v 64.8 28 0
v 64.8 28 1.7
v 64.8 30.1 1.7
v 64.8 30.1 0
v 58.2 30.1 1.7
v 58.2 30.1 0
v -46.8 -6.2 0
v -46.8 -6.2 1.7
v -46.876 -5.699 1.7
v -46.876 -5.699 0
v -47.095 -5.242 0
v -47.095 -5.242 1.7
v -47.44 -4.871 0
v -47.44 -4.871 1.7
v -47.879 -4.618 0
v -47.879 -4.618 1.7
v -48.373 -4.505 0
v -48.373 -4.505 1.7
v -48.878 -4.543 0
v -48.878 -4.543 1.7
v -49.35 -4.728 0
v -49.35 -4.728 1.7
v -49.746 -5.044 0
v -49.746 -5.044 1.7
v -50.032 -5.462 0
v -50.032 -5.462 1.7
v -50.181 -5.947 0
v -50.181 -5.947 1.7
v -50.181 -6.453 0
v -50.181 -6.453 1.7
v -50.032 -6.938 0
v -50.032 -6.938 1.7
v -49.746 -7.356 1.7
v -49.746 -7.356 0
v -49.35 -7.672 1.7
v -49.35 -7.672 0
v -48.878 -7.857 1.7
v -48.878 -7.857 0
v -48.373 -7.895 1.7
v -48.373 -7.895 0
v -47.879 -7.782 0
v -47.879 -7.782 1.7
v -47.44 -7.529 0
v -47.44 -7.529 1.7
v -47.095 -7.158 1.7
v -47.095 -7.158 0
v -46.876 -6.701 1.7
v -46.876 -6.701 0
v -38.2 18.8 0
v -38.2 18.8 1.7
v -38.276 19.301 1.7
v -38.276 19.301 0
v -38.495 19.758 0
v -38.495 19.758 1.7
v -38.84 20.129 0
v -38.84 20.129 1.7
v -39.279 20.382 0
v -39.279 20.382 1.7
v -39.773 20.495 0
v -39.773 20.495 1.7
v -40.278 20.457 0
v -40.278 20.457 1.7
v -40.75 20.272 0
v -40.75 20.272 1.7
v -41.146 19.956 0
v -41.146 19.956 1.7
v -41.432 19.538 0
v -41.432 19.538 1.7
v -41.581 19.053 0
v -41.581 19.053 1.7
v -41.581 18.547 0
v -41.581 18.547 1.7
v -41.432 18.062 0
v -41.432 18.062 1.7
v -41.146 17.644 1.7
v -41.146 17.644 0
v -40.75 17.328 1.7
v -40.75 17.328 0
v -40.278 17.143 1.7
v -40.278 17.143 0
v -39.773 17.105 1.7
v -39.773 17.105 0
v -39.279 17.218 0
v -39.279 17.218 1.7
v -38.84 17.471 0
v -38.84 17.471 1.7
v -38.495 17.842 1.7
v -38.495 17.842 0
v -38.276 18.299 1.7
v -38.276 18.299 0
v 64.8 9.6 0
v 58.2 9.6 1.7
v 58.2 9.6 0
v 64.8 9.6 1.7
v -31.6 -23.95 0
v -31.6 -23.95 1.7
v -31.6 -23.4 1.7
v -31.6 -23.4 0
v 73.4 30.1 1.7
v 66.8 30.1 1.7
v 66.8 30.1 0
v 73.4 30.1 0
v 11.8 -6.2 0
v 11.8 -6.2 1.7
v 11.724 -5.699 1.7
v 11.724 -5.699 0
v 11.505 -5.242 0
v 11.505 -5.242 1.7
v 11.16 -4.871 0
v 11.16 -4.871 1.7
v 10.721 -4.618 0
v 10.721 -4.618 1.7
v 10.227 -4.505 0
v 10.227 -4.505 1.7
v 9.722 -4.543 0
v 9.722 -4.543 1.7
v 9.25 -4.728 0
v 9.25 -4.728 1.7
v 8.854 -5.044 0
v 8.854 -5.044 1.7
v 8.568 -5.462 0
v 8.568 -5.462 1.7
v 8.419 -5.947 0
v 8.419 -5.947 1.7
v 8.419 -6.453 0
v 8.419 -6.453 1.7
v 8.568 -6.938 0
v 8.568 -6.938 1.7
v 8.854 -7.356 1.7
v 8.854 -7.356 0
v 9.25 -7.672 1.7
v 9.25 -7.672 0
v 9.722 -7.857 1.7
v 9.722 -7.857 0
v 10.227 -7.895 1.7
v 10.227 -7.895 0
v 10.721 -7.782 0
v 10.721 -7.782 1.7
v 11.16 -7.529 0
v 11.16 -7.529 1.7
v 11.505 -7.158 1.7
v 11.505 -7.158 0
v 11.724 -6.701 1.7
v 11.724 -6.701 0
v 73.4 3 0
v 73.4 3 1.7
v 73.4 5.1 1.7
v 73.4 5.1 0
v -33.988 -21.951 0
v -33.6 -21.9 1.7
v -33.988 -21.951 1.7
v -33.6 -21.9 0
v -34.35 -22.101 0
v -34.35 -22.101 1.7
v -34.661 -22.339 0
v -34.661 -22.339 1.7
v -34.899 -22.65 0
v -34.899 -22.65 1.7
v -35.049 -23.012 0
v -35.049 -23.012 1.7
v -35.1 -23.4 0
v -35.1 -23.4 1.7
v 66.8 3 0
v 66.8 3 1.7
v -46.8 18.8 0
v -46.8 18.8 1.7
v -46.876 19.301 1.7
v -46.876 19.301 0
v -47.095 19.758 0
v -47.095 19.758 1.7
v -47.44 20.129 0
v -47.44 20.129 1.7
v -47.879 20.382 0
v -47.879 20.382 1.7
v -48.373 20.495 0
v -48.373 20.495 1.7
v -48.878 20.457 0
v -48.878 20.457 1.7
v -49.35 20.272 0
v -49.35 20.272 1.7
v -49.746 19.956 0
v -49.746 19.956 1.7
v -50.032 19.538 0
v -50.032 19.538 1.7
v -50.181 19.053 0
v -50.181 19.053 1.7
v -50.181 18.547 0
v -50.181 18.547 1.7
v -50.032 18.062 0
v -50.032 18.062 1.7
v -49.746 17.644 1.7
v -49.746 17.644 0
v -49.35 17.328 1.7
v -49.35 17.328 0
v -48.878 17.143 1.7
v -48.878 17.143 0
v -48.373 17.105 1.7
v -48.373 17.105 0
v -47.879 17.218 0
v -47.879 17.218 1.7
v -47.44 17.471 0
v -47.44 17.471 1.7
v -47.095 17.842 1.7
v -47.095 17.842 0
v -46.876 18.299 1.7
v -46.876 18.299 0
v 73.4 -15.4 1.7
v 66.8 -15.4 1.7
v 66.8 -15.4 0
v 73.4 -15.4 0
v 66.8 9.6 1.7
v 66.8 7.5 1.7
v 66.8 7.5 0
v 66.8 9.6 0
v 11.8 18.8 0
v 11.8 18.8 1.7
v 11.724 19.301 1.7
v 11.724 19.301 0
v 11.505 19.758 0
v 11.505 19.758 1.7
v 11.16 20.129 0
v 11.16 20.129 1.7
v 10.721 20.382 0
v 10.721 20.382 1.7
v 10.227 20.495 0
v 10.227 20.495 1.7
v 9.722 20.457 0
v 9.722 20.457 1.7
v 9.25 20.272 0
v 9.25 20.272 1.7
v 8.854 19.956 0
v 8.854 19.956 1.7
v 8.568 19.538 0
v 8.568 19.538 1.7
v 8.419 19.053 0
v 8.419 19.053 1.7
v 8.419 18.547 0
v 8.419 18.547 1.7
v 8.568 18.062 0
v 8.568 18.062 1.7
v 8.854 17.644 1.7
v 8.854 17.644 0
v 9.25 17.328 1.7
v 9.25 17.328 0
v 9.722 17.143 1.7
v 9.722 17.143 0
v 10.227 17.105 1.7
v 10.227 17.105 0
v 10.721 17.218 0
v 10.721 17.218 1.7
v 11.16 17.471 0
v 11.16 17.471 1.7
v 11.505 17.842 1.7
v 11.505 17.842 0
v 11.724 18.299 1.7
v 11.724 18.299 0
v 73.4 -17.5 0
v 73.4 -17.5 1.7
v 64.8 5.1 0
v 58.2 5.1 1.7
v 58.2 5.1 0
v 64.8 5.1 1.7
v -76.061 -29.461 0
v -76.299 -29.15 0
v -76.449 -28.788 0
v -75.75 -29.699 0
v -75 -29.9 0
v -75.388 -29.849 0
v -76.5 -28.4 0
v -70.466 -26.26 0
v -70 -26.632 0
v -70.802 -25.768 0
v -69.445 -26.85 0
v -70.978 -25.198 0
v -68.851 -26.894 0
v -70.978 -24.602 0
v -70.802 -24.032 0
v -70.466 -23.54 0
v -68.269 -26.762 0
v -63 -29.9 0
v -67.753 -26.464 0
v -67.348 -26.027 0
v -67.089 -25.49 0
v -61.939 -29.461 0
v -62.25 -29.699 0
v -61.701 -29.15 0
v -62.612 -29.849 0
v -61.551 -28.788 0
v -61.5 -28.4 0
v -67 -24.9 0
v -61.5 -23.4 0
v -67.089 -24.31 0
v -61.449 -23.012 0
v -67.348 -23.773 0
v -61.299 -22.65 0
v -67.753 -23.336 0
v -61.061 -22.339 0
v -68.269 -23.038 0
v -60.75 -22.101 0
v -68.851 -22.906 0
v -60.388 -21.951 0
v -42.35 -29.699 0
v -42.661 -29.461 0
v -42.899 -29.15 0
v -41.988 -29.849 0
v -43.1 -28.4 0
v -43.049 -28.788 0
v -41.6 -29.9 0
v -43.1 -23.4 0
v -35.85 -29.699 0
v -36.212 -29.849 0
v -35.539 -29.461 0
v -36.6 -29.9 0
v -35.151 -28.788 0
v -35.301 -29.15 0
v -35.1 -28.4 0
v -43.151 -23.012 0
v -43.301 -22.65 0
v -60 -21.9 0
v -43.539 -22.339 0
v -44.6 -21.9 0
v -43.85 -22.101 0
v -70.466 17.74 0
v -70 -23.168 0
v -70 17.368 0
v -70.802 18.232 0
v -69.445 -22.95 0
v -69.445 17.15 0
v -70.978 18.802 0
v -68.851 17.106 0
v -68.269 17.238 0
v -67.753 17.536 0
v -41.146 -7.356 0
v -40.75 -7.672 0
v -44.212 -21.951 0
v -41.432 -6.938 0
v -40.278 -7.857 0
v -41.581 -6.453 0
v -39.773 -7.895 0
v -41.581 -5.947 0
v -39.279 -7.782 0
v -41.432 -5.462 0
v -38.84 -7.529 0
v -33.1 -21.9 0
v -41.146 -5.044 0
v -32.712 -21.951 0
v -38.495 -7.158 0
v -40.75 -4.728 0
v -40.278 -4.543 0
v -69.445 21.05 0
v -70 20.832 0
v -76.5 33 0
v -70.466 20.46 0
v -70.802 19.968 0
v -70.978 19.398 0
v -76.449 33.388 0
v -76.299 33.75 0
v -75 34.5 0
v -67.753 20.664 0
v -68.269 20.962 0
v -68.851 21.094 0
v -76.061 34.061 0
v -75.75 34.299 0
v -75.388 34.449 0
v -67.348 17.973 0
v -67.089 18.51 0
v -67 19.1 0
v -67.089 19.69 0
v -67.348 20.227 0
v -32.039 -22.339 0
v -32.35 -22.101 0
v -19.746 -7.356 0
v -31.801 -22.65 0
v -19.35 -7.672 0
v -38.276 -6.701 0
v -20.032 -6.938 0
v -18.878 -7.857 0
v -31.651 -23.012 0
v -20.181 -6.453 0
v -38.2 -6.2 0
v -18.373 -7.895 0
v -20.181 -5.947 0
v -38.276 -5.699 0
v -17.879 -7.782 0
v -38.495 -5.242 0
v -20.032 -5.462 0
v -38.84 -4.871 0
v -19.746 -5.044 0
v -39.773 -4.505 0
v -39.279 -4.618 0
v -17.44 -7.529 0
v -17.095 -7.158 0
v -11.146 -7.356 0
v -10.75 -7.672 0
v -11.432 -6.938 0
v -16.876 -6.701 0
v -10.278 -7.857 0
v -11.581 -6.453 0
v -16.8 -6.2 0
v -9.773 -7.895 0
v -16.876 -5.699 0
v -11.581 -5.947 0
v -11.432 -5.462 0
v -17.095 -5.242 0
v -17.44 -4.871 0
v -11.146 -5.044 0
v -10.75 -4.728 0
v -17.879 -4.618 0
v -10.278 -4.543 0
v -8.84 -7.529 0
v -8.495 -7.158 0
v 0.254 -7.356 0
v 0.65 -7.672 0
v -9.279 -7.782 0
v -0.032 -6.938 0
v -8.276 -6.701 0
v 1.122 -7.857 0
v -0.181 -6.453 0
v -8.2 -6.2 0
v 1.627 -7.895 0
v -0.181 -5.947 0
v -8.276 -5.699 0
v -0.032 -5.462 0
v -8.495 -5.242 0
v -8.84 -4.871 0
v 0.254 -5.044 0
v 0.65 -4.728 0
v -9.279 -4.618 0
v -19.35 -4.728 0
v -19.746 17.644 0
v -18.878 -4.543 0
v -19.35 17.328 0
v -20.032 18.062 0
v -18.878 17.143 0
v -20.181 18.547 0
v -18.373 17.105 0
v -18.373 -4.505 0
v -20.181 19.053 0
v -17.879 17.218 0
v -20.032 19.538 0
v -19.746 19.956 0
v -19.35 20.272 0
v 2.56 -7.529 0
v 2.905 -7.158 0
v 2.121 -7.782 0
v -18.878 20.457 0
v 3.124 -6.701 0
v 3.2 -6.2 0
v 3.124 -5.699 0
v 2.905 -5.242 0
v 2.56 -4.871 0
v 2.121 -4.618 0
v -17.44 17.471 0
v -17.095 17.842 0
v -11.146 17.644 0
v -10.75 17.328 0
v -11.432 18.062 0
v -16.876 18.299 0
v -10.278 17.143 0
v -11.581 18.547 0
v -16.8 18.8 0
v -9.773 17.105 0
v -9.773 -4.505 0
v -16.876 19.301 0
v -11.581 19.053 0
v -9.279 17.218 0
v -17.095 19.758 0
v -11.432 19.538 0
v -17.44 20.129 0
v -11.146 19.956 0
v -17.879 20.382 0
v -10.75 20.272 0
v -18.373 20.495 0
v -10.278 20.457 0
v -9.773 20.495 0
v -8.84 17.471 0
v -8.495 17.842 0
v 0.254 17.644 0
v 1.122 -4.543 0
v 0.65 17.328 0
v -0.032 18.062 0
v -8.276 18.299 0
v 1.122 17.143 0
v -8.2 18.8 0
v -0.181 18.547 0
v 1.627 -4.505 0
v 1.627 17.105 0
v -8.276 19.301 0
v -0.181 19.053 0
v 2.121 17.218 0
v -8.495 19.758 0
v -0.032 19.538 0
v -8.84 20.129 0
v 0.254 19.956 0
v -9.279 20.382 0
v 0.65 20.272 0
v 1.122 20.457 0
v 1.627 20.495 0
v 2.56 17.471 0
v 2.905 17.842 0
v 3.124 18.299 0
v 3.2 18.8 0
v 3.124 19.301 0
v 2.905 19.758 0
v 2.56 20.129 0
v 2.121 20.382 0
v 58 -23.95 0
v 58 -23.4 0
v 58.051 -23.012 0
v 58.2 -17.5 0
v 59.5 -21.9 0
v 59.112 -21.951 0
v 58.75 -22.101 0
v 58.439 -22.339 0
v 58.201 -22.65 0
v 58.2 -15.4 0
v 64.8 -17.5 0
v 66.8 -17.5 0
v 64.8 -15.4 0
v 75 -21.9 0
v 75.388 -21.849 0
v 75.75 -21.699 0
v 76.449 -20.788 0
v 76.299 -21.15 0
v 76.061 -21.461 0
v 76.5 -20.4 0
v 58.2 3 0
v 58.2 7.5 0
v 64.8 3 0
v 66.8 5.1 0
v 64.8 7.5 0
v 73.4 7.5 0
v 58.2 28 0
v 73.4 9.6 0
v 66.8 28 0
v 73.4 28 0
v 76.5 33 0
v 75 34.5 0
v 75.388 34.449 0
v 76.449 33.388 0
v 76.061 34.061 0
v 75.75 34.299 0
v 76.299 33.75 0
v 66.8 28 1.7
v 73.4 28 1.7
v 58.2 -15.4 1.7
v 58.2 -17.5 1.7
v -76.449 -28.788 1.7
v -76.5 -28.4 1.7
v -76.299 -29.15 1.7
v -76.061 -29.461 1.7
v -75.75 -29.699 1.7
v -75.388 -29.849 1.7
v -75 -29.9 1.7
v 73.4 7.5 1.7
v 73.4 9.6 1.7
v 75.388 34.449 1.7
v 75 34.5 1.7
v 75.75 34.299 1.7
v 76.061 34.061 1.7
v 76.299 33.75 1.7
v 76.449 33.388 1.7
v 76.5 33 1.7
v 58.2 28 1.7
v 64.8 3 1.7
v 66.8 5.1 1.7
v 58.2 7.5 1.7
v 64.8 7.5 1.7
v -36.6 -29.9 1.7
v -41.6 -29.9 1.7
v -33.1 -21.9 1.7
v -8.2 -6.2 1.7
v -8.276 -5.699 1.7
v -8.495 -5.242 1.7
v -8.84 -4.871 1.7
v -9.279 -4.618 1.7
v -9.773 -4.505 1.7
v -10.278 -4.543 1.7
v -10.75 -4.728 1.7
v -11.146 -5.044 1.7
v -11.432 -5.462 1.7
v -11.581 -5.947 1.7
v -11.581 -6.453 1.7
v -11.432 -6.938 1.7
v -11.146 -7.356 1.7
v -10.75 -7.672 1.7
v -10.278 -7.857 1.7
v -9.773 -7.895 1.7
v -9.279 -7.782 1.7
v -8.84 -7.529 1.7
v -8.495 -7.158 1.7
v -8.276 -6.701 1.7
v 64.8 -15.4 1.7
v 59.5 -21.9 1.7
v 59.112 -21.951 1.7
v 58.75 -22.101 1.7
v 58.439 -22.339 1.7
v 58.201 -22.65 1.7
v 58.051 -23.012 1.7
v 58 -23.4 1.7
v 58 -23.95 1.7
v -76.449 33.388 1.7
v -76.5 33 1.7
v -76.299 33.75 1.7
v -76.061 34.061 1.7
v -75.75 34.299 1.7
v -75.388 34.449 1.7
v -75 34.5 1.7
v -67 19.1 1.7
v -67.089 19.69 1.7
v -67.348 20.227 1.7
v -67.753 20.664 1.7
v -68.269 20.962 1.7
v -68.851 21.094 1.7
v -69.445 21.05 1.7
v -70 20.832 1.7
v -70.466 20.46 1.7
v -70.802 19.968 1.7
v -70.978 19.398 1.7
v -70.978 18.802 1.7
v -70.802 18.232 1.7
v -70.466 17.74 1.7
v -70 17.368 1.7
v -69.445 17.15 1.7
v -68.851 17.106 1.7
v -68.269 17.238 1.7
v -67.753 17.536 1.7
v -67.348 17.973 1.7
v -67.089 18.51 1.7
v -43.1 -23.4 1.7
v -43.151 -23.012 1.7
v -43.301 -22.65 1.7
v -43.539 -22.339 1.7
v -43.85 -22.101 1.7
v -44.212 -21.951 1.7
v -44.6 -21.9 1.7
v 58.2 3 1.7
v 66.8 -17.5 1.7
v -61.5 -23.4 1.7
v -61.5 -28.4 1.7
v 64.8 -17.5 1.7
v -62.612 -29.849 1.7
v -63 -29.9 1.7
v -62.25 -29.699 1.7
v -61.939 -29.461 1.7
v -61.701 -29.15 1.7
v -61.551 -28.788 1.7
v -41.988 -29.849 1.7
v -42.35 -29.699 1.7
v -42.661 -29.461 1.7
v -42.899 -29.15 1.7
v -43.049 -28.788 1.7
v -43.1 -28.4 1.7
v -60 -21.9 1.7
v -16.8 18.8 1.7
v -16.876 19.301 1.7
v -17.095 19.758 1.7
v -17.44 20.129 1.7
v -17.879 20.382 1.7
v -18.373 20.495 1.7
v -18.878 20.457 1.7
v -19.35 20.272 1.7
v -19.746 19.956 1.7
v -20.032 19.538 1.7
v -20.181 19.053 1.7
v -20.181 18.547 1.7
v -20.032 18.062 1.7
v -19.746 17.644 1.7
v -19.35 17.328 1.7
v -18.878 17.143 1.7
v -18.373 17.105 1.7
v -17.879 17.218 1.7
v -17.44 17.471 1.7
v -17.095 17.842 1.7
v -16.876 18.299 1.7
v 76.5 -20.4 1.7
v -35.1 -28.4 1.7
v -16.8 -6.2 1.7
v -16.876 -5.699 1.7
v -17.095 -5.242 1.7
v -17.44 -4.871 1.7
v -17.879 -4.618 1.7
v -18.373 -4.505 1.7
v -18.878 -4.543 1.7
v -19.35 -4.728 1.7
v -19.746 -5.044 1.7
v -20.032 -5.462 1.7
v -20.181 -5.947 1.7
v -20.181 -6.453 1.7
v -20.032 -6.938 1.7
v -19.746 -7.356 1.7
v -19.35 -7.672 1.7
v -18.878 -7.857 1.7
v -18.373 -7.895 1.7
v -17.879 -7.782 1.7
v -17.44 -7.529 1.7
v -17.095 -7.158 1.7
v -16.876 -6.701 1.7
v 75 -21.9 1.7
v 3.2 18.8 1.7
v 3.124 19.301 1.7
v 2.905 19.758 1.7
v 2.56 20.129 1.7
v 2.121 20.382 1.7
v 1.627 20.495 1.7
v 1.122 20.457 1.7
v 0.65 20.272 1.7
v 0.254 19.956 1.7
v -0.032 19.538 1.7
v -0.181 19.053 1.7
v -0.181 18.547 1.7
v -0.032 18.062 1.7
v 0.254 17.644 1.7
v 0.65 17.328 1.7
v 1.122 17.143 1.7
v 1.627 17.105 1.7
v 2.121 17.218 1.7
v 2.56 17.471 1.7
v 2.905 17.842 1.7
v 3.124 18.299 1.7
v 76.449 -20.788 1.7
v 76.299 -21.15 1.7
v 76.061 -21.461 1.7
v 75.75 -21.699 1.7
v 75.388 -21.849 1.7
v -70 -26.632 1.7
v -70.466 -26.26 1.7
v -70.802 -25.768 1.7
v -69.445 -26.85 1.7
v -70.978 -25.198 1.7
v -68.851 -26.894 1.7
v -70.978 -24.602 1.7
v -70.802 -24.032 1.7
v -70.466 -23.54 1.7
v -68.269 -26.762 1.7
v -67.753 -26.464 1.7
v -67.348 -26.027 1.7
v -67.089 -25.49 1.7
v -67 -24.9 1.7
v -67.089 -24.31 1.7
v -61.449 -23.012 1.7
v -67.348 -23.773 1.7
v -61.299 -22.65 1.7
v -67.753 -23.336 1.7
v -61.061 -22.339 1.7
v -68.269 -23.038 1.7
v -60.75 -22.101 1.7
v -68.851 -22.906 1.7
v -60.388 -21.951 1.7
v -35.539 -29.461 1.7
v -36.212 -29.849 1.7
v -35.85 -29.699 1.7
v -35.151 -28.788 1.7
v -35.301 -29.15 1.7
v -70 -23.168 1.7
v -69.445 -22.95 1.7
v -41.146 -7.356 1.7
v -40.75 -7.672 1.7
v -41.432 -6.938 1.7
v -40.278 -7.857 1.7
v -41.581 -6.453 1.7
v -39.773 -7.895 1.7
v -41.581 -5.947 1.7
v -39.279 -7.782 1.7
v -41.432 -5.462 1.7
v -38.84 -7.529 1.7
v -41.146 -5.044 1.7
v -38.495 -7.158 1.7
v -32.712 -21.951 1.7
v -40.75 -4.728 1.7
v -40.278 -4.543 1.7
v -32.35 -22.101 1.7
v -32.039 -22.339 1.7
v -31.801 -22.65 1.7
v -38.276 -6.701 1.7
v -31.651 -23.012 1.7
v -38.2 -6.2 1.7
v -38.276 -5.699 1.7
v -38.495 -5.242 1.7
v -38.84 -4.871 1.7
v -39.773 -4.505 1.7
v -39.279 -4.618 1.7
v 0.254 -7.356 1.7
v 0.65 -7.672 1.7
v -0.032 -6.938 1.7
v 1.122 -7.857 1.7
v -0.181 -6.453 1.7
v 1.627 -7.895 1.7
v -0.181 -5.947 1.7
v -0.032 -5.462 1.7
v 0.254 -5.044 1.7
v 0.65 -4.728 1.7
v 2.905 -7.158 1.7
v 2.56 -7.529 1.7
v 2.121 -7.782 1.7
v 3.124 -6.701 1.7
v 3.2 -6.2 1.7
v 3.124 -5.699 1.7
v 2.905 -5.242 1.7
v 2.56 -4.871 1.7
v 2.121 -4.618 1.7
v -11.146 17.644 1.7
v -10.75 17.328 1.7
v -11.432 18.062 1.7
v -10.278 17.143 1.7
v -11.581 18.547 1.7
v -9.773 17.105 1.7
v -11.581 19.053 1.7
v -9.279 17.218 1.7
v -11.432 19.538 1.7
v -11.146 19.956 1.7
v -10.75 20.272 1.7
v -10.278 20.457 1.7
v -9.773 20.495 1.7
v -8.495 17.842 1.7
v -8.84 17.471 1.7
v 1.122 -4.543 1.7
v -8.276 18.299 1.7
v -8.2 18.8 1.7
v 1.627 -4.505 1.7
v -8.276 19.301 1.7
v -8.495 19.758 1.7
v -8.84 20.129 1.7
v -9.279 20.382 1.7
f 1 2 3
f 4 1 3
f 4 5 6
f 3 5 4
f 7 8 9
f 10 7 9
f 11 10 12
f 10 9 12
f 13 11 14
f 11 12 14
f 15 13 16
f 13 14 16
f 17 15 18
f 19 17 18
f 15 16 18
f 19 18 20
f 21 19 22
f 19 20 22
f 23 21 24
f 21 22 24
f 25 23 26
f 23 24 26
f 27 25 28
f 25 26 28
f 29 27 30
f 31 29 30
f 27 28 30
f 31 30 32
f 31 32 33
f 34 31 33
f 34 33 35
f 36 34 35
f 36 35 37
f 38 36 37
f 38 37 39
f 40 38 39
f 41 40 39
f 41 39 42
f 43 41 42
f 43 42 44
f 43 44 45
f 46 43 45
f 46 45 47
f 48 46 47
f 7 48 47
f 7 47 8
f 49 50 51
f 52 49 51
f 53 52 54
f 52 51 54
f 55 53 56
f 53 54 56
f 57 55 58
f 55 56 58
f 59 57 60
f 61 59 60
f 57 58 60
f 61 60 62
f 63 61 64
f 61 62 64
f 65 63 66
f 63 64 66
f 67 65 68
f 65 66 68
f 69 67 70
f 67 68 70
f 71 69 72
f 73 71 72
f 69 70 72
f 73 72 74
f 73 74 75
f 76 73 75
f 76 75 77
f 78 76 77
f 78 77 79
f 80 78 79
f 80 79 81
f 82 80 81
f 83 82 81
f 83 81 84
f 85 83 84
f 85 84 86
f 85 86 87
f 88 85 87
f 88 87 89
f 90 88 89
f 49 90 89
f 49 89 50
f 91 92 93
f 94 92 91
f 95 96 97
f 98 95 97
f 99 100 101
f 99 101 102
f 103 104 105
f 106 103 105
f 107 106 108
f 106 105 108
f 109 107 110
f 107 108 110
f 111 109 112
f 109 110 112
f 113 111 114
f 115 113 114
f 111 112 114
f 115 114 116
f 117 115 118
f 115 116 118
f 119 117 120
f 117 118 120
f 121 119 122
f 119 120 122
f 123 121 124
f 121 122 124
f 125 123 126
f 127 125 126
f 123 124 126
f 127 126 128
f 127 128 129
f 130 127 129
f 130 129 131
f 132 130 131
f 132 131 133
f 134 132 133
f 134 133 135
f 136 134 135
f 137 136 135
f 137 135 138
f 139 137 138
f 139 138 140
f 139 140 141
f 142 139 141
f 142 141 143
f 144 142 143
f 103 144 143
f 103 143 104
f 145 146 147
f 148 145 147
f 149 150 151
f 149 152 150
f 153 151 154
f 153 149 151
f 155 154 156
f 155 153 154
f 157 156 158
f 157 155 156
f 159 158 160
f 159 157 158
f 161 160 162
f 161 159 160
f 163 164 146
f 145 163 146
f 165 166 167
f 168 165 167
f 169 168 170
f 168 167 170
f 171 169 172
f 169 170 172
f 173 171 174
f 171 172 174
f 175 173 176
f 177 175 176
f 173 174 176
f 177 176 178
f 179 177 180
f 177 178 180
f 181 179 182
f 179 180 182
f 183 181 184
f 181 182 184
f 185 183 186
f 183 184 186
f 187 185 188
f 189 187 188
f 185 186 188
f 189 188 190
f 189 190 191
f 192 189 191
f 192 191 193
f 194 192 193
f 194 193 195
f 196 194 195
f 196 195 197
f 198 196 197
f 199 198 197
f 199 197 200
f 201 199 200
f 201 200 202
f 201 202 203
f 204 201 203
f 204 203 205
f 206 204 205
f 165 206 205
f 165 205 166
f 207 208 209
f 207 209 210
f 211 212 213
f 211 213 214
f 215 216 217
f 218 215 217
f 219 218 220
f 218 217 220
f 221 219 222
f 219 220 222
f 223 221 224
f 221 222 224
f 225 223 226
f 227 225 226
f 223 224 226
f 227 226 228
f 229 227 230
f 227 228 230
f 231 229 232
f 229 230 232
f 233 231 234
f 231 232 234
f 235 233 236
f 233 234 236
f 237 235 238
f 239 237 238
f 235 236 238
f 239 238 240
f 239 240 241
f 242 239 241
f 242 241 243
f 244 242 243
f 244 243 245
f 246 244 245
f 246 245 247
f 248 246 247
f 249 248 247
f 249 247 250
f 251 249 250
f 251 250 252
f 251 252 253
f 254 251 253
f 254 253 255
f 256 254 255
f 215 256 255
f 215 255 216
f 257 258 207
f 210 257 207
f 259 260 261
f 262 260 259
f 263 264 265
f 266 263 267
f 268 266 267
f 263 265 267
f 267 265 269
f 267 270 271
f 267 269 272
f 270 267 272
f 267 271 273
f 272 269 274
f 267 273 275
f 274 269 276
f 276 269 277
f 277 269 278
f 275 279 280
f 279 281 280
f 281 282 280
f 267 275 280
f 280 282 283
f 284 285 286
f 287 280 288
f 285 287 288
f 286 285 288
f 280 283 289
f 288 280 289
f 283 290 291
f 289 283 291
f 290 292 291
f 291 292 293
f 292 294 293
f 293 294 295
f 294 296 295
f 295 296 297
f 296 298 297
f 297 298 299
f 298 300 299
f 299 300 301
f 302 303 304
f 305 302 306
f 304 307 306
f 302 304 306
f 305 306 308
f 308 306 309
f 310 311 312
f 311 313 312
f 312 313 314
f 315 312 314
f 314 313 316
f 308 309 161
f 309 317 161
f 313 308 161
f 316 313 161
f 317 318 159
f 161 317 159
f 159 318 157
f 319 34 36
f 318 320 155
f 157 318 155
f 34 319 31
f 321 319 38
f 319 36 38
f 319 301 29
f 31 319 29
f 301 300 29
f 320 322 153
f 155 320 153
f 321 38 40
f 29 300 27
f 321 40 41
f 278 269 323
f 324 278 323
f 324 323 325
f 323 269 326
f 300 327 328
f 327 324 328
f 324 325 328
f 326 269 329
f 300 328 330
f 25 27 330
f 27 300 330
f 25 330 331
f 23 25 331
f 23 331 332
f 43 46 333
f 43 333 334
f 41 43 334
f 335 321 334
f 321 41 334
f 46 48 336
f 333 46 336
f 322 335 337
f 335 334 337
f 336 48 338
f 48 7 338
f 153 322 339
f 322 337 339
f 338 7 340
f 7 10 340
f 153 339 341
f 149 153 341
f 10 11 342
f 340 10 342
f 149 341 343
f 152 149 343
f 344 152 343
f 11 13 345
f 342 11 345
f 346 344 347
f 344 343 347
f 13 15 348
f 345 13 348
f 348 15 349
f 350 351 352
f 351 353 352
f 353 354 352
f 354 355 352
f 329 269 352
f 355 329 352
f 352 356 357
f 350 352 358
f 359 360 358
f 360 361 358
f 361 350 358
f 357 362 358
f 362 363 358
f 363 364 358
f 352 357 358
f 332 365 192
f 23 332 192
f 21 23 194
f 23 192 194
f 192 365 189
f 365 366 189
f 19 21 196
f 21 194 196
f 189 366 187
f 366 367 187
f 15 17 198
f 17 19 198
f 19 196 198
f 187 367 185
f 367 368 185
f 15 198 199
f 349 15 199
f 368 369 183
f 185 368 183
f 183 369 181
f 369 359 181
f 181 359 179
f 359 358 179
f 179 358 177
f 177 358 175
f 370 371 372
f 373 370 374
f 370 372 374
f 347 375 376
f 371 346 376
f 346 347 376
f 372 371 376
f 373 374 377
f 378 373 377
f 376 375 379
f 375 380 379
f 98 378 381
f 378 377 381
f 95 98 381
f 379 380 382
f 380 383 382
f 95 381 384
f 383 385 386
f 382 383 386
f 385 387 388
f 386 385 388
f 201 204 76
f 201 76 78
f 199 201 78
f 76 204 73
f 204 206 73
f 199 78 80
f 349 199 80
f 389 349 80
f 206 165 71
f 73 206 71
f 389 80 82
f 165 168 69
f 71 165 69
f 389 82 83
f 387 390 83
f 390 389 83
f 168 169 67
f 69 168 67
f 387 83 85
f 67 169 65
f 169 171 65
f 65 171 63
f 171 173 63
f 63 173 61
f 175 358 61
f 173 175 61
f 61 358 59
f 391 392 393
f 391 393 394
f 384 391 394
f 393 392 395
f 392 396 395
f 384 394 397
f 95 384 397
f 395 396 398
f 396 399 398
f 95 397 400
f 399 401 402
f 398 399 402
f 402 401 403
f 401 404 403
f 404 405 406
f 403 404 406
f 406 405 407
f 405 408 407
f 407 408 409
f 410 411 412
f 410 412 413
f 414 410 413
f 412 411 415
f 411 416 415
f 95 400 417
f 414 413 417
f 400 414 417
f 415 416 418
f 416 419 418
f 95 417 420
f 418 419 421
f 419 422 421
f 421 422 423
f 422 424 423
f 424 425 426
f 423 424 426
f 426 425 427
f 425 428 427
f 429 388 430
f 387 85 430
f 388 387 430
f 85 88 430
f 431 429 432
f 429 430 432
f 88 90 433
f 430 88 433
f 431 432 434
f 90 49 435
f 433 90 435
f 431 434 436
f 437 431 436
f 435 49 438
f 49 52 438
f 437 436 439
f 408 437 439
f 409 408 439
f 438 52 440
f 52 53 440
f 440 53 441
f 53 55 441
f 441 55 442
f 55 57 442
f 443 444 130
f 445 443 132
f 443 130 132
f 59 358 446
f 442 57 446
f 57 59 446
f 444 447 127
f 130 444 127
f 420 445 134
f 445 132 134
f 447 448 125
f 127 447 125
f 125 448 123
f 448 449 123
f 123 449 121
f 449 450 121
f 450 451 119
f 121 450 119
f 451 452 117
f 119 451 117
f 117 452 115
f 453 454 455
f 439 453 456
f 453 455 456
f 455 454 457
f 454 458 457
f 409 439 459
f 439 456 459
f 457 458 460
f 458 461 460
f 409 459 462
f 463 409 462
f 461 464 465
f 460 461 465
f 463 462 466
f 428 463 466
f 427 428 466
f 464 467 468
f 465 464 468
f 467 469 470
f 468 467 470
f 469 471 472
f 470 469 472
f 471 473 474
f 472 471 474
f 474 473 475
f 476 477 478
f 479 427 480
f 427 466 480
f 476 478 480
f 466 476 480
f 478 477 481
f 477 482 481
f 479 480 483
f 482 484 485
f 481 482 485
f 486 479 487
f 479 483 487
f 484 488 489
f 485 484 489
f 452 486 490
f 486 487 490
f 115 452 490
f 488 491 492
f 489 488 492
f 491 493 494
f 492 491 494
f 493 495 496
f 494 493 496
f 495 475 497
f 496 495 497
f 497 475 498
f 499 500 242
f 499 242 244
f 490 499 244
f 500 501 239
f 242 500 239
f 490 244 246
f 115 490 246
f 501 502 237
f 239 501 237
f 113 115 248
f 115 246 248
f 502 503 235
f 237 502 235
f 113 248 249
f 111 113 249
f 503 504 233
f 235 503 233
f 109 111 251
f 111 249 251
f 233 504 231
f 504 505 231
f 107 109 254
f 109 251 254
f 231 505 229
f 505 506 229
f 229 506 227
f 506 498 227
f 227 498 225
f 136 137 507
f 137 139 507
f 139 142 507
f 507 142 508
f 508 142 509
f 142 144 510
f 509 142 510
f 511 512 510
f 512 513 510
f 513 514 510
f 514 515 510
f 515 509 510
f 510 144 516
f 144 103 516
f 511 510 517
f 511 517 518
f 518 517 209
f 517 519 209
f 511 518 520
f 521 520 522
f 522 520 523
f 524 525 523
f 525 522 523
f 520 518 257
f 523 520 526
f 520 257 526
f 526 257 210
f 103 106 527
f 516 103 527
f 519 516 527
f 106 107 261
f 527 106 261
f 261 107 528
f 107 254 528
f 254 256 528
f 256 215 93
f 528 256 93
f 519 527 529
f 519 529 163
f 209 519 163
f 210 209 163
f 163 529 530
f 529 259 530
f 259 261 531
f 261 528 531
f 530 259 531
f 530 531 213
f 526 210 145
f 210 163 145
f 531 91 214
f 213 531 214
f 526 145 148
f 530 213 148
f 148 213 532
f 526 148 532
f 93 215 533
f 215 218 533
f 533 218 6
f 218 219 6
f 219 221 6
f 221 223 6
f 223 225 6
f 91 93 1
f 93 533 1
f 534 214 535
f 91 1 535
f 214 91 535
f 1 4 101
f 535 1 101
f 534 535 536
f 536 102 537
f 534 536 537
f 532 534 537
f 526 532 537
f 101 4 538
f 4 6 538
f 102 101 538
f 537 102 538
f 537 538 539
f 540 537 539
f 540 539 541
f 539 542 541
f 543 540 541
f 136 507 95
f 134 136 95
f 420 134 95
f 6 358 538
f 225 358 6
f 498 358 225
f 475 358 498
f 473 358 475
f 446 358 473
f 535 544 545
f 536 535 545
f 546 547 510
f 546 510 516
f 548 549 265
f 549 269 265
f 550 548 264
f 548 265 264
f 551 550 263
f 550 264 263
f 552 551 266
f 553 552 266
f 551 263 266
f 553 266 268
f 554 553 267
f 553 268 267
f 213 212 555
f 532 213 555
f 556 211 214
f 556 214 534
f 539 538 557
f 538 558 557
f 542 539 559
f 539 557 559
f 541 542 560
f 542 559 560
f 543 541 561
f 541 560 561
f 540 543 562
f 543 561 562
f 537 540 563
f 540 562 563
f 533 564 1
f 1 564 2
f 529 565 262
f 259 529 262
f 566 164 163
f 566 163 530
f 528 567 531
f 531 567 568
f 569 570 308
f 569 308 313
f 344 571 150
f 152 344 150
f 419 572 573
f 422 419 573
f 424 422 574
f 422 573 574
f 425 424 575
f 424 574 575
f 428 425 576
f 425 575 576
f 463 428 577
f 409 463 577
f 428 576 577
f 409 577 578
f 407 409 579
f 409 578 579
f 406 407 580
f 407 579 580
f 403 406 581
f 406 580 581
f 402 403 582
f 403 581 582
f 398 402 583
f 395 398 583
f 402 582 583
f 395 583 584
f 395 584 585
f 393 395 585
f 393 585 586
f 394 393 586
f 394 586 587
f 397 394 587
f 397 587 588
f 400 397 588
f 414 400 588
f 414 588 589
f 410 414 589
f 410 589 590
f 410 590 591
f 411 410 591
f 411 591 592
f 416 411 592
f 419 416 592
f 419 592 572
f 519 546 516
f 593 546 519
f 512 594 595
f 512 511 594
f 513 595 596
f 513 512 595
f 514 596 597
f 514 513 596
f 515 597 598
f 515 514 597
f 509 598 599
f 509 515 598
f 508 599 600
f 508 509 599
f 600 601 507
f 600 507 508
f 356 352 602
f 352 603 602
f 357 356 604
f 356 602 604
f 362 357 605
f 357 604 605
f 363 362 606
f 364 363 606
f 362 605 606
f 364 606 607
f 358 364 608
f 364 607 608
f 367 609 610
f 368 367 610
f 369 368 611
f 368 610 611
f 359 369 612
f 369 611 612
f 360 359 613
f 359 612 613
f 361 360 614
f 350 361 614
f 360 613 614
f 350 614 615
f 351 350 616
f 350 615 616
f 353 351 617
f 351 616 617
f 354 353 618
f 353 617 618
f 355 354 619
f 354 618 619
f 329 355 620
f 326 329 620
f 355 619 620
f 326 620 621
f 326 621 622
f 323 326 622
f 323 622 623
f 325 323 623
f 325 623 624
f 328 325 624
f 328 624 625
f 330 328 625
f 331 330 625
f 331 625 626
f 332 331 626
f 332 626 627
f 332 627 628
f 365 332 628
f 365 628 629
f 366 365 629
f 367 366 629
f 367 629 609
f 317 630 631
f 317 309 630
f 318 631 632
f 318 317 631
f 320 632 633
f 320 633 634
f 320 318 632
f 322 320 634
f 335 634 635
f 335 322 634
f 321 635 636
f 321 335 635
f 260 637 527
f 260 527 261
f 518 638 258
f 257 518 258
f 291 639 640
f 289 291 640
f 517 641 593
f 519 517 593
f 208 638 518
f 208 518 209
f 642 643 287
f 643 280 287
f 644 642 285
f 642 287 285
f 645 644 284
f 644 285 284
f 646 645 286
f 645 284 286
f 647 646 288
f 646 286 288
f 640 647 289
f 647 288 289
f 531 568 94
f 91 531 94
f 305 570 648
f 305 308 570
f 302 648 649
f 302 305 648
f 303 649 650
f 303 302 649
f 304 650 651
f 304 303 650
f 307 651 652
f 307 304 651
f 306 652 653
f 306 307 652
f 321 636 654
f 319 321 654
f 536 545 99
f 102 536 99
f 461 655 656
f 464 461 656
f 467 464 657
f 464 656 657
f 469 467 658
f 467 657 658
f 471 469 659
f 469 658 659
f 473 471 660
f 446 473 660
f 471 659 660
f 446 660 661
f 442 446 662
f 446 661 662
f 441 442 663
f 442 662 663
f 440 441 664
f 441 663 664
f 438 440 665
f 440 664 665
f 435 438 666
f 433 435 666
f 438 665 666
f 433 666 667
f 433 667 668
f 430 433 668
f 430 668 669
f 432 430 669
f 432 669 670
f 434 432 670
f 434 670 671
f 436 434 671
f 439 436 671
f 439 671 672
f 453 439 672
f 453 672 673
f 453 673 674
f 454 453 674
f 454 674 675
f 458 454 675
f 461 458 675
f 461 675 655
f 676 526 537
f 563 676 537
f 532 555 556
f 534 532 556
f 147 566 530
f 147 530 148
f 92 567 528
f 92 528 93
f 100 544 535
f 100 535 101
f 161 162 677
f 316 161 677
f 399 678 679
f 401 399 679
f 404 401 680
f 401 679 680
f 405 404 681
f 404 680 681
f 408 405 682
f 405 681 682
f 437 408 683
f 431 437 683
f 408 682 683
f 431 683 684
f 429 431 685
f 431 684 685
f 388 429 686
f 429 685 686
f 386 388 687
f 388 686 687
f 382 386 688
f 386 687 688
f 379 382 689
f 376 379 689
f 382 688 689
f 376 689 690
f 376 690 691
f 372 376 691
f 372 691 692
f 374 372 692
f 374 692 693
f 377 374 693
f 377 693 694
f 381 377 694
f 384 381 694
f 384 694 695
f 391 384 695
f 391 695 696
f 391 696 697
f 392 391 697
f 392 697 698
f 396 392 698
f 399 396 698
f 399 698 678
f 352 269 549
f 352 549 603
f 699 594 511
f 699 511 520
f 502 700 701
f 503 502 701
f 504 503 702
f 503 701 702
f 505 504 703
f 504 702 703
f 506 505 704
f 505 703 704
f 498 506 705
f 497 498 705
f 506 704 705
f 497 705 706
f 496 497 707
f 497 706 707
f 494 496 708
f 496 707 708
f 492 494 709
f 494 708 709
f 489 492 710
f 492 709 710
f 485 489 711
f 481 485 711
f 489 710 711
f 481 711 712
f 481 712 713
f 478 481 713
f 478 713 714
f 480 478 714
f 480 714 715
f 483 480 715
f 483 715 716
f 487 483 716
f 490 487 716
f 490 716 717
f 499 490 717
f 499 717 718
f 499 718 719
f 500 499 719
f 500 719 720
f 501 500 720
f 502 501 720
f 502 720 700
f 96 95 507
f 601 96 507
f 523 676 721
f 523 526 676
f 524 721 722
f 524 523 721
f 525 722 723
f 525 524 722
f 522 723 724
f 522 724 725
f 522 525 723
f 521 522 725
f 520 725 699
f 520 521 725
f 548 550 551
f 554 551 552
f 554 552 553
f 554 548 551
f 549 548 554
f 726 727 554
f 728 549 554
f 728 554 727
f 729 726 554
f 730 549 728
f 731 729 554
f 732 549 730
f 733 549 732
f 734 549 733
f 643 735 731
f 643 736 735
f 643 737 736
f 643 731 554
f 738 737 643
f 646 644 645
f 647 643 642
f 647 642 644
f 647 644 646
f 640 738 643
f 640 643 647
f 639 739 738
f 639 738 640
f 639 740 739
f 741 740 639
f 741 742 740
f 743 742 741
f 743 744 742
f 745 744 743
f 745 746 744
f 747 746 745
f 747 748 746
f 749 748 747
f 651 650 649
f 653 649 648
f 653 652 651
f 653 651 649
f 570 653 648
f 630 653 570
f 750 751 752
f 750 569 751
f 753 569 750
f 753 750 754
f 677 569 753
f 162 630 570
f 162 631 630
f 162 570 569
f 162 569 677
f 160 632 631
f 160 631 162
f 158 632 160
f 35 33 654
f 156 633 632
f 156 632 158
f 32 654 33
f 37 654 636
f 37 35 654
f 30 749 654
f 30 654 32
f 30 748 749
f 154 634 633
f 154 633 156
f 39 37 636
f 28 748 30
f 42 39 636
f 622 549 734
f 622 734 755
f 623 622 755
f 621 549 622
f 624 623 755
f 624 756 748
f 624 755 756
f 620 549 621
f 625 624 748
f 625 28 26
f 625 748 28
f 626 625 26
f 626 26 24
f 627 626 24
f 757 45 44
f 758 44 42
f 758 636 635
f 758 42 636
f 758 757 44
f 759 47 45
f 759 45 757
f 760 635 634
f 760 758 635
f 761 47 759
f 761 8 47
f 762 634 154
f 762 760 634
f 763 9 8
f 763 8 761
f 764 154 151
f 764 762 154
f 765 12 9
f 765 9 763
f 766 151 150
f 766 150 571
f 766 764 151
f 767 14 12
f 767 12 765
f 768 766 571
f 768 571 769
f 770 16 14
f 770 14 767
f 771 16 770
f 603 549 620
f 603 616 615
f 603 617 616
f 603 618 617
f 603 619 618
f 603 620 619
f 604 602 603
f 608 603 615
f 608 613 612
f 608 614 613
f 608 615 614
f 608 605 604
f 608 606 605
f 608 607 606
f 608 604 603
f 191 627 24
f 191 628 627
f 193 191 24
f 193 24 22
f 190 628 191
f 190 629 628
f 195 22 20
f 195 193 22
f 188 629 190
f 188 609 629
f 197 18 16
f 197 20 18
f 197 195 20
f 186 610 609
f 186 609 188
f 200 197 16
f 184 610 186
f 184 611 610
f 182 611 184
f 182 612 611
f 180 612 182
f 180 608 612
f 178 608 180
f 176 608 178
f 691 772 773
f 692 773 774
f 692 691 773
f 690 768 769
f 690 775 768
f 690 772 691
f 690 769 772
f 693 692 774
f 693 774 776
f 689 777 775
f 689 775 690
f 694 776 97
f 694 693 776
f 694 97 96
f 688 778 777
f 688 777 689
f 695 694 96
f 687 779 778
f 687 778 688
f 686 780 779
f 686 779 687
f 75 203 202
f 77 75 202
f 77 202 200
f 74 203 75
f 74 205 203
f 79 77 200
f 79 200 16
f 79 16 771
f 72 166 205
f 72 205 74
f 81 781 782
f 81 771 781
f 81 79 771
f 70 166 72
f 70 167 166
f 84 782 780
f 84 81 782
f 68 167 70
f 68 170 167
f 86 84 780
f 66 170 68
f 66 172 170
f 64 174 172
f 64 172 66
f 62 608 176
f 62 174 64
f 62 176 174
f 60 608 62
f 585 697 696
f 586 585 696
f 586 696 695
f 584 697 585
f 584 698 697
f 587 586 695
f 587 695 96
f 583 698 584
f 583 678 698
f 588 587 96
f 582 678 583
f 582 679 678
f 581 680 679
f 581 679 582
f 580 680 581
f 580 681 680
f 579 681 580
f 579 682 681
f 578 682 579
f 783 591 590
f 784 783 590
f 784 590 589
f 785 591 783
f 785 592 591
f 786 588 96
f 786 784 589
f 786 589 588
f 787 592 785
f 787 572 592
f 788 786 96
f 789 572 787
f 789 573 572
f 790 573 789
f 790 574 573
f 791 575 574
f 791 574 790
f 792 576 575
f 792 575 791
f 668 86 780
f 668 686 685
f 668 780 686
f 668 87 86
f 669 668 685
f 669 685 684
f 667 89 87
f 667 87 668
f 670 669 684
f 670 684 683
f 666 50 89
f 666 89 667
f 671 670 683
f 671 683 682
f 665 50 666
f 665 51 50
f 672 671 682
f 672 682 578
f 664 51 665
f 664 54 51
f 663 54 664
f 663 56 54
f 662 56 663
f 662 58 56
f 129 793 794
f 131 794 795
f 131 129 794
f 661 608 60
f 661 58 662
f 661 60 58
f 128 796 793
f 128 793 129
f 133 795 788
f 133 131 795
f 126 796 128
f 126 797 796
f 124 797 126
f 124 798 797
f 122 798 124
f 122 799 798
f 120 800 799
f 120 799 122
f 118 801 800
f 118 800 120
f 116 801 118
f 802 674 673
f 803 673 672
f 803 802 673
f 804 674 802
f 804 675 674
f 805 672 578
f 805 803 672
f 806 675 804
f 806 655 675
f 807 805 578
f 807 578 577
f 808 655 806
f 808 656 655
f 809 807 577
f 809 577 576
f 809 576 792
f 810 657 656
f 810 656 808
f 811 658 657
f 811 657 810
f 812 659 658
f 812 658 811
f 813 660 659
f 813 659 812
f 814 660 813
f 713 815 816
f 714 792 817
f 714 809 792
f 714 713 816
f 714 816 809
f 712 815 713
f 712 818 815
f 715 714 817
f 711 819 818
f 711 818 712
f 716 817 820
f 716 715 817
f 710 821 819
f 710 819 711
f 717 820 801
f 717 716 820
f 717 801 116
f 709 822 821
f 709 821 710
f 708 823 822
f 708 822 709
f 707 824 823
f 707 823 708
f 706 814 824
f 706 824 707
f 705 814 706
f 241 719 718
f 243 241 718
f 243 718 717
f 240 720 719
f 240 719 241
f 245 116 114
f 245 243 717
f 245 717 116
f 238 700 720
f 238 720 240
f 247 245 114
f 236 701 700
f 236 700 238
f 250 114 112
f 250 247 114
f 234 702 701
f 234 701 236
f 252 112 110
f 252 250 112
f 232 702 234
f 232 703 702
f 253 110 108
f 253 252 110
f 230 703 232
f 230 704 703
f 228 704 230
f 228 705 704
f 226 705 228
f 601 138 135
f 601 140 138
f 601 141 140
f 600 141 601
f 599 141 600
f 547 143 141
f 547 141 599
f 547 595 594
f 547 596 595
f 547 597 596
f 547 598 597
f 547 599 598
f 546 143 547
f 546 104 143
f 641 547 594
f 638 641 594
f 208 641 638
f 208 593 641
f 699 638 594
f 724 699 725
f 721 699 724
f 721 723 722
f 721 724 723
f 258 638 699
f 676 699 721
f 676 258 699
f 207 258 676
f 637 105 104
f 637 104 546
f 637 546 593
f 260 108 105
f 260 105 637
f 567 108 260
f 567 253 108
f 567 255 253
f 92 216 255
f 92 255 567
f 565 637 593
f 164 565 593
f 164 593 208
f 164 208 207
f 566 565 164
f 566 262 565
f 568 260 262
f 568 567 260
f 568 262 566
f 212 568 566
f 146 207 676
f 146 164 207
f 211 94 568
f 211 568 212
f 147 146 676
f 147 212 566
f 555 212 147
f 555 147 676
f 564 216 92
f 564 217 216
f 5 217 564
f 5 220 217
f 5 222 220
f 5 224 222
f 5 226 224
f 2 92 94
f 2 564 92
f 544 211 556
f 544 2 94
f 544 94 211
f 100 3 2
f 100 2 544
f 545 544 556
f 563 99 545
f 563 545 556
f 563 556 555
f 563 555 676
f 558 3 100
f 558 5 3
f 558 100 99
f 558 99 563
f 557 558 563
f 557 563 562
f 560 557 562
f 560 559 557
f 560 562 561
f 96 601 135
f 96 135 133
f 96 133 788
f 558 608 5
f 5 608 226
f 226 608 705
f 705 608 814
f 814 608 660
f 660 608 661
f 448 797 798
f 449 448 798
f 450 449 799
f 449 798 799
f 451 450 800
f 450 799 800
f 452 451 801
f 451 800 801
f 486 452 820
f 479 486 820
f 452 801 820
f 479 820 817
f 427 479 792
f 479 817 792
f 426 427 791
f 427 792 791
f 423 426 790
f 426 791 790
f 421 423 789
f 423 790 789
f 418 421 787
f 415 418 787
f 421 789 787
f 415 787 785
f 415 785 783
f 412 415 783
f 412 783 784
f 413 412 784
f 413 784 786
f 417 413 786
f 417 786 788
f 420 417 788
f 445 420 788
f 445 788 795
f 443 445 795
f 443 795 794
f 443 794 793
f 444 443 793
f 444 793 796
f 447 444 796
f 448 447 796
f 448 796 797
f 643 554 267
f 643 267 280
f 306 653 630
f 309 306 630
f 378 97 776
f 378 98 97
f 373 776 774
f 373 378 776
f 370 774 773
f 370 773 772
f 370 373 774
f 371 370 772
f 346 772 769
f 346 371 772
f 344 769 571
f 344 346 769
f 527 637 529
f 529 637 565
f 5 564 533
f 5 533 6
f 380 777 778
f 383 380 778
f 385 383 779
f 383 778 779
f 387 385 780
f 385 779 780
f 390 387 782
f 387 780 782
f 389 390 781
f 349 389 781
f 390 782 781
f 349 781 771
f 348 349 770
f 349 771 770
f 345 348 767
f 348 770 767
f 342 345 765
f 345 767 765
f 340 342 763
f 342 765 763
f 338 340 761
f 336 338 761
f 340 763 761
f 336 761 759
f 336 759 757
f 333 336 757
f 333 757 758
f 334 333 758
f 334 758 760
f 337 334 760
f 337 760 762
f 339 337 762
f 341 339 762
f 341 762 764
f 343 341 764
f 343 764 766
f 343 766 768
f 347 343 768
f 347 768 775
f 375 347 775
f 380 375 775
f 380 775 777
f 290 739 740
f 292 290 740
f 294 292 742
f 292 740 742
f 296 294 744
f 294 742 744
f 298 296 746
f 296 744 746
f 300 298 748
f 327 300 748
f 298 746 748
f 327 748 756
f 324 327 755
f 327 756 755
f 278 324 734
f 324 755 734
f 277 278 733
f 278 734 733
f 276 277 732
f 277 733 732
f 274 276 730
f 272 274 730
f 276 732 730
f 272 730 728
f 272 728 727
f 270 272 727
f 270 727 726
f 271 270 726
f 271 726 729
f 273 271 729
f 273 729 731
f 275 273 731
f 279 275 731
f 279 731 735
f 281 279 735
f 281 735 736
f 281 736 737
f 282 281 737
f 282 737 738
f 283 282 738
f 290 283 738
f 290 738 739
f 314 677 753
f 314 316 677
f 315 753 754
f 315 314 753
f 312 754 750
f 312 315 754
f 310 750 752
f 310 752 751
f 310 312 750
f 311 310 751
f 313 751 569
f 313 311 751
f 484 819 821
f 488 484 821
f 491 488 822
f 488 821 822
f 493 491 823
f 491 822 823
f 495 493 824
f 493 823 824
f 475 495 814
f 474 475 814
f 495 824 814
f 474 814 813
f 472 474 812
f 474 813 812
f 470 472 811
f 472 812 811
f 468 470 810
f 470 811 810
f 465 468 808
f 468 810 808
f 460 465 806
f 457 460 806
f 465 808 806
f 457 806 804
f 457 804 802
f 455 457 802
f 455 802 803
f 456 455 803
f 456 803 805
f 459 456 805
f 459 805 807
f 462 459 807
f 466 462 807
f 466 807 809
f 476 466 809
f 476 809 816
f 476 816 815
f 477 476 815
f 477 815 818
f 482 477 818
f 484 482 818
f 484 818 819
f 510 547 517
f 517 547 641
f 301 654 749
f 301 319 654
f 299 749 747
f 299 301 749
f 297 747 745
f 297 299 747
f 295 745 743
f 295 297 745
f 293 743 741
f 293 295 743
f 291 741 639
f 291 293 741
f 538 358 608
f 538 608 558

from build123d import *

# Parameters (mm, degrees)
F0_W     = 153
F0_H     = 69
F1_DEPTH = 1.7
F2_W     = 15
F2_H     = 4.6
F2_W_2   = 8
F2_W_3   = 1.9
F2_H_2   = 8.5
F2_W_4   = 18.5
F2_H_3   = 12.6
F2_R     = 2
F2_W_5   = 6.6
F2_H_4   = 2.1
F2_R_2   = 1.7
F3_DEPTH = 1.701
F4_W     = 89.6
F4_H     = 10.55
F5_DEPTH = 1.701
F6_R     = 1.5


with BuildPart() as f1:
    # F0 (on Top) → F1 (new body)
    with BuildSketch(Plane.XY):
        Rectangle(F0_W, F0_H)
    extrude(amount=F1_DEPTH)

    # F2 (on face) → F3 (cut, through all)
    with BuildSketch(Plane.XY.offset(1.7)):
        with Locations((-69, -32.2)):
            Rectangle(F2_W, F2_H)
        Polygon((-61.5, -29.9), (-61.5, -34.5), (-43.1, -34.5), (-43.1, -29.9), (-43.1, -21.9), (-61.5, -21.9), align=None)
        with Locations((-39.1, -32.2)):
            Rectangle(F2_W_2, F2_H)
        Polygon((-35.1, -29.9), (-35.1, -34.5), (-31.6, -34.5), (-31.6, -21.9), (-35.1, -21.9), align=None)
        with Locations((-19.35, -30.25)):
            Rectangle(F2_W_3, F2_H_2)
        with Locations((67.25, -28.2)):
            Rectangle(F2_W_4, F2_H_3)
        with Locations((-69, -24.9)):
            Circle(F2_R)
        with Locations((-69, 19.1)):
            Circle(F2_R)
        with Locations((61.5, 29.05)):
            Rectangle(F2_W_5, F2_H_4)
        with Locations((61.5, 8.55)):
            Rectangle(F2_W_5, F2_H_4)
        with Locations((-48.5, 18.8)):
            Circle(F2_R_2)
        with Locations((-18.5, 18.8)):
            Circle(F2_R_2)
        with Locations((1.5, 18.8)):
            Circle(F2_R_2)
        with Locations((-39.9, 18.8)):
            Circle(F2_R_2)
        with Locations((-9.9, 18.8)):
            Circle(F2_R_2)
        with Locations((10.1, 18.8)):
            Circle(F2_R_2)
        with Locations((70.1, 8.55)):
            Rectangle(F2_W_5, F2_H_4)
        with Locations((70.1, 29.05)):
            Rectangle(F2_W_5, F2_H_4)
        with Locations((70.1, -16.45)):
            Rectangle(F2_W_5, F2_H_4)
        with Locations((61.5, 4.05)):
            Rectangle(F2_W_5, F2_H_4)
        with Locations((70.1, 4.05)):
            Rectangle(F2_W_5, F2_H_4)
        with Locations((61.5, -16.45)):
            Rectangle(F2_W_5, F2_H_4)
        with Locations((1.5, -6.2)):
            Circle(F2_R_2)
        with Locations((-18.5, -6.2)):
            Circle(F2_R_2)
        with Locations((-9.9, -6.2)):
            Circle(F2_R_2)
        with Locations((10.1, -6.2)):
            Circle(F2_R_2)
        with Locations((-39.9, -6.2)):
            Circle(F2_R_2)
        with Locations((-48.5, -6.2)):
            Circle(F2_R_2)
    extrude(amount=-F3_DEPTH, mode=Mode.SUBTRACT)

    # F4 (on Top) → F5 (cut, through all)
    with BuildSketch(Plane.XY):
        with Locations((13.2, -29.225)):
            Rectangle(F4_W, F4_H)
    extrude(amount=F5_DEPTH, mode=Mode.SUBTRACT)

    # F6
    f6_edges = [f1.edges().sort_by_distance(p)[0] for p in [
        (-35.1, -21.9, 0.85),
        (-31.6, -21.9, 0.85),
        (-43.1, -21.9, 0.85),
        (58, -21.9, 0.85),
        (76.5, -21.9, 0.85),
        (-35.1, -29.9, 0.85),
        (-43.1, -29.9, 0.85),
        (-76.5, -29.9, 0.85),
        (-61.5, -29.9, 0.85),
        (-61.5, -21.9, 0.85),
        (76.5, 34.5, 0.85),
        (-76.5, 34.5, 0.85),
    ]]
    fillet(f6_edges, radius=F6_R)


solid = f1.part
